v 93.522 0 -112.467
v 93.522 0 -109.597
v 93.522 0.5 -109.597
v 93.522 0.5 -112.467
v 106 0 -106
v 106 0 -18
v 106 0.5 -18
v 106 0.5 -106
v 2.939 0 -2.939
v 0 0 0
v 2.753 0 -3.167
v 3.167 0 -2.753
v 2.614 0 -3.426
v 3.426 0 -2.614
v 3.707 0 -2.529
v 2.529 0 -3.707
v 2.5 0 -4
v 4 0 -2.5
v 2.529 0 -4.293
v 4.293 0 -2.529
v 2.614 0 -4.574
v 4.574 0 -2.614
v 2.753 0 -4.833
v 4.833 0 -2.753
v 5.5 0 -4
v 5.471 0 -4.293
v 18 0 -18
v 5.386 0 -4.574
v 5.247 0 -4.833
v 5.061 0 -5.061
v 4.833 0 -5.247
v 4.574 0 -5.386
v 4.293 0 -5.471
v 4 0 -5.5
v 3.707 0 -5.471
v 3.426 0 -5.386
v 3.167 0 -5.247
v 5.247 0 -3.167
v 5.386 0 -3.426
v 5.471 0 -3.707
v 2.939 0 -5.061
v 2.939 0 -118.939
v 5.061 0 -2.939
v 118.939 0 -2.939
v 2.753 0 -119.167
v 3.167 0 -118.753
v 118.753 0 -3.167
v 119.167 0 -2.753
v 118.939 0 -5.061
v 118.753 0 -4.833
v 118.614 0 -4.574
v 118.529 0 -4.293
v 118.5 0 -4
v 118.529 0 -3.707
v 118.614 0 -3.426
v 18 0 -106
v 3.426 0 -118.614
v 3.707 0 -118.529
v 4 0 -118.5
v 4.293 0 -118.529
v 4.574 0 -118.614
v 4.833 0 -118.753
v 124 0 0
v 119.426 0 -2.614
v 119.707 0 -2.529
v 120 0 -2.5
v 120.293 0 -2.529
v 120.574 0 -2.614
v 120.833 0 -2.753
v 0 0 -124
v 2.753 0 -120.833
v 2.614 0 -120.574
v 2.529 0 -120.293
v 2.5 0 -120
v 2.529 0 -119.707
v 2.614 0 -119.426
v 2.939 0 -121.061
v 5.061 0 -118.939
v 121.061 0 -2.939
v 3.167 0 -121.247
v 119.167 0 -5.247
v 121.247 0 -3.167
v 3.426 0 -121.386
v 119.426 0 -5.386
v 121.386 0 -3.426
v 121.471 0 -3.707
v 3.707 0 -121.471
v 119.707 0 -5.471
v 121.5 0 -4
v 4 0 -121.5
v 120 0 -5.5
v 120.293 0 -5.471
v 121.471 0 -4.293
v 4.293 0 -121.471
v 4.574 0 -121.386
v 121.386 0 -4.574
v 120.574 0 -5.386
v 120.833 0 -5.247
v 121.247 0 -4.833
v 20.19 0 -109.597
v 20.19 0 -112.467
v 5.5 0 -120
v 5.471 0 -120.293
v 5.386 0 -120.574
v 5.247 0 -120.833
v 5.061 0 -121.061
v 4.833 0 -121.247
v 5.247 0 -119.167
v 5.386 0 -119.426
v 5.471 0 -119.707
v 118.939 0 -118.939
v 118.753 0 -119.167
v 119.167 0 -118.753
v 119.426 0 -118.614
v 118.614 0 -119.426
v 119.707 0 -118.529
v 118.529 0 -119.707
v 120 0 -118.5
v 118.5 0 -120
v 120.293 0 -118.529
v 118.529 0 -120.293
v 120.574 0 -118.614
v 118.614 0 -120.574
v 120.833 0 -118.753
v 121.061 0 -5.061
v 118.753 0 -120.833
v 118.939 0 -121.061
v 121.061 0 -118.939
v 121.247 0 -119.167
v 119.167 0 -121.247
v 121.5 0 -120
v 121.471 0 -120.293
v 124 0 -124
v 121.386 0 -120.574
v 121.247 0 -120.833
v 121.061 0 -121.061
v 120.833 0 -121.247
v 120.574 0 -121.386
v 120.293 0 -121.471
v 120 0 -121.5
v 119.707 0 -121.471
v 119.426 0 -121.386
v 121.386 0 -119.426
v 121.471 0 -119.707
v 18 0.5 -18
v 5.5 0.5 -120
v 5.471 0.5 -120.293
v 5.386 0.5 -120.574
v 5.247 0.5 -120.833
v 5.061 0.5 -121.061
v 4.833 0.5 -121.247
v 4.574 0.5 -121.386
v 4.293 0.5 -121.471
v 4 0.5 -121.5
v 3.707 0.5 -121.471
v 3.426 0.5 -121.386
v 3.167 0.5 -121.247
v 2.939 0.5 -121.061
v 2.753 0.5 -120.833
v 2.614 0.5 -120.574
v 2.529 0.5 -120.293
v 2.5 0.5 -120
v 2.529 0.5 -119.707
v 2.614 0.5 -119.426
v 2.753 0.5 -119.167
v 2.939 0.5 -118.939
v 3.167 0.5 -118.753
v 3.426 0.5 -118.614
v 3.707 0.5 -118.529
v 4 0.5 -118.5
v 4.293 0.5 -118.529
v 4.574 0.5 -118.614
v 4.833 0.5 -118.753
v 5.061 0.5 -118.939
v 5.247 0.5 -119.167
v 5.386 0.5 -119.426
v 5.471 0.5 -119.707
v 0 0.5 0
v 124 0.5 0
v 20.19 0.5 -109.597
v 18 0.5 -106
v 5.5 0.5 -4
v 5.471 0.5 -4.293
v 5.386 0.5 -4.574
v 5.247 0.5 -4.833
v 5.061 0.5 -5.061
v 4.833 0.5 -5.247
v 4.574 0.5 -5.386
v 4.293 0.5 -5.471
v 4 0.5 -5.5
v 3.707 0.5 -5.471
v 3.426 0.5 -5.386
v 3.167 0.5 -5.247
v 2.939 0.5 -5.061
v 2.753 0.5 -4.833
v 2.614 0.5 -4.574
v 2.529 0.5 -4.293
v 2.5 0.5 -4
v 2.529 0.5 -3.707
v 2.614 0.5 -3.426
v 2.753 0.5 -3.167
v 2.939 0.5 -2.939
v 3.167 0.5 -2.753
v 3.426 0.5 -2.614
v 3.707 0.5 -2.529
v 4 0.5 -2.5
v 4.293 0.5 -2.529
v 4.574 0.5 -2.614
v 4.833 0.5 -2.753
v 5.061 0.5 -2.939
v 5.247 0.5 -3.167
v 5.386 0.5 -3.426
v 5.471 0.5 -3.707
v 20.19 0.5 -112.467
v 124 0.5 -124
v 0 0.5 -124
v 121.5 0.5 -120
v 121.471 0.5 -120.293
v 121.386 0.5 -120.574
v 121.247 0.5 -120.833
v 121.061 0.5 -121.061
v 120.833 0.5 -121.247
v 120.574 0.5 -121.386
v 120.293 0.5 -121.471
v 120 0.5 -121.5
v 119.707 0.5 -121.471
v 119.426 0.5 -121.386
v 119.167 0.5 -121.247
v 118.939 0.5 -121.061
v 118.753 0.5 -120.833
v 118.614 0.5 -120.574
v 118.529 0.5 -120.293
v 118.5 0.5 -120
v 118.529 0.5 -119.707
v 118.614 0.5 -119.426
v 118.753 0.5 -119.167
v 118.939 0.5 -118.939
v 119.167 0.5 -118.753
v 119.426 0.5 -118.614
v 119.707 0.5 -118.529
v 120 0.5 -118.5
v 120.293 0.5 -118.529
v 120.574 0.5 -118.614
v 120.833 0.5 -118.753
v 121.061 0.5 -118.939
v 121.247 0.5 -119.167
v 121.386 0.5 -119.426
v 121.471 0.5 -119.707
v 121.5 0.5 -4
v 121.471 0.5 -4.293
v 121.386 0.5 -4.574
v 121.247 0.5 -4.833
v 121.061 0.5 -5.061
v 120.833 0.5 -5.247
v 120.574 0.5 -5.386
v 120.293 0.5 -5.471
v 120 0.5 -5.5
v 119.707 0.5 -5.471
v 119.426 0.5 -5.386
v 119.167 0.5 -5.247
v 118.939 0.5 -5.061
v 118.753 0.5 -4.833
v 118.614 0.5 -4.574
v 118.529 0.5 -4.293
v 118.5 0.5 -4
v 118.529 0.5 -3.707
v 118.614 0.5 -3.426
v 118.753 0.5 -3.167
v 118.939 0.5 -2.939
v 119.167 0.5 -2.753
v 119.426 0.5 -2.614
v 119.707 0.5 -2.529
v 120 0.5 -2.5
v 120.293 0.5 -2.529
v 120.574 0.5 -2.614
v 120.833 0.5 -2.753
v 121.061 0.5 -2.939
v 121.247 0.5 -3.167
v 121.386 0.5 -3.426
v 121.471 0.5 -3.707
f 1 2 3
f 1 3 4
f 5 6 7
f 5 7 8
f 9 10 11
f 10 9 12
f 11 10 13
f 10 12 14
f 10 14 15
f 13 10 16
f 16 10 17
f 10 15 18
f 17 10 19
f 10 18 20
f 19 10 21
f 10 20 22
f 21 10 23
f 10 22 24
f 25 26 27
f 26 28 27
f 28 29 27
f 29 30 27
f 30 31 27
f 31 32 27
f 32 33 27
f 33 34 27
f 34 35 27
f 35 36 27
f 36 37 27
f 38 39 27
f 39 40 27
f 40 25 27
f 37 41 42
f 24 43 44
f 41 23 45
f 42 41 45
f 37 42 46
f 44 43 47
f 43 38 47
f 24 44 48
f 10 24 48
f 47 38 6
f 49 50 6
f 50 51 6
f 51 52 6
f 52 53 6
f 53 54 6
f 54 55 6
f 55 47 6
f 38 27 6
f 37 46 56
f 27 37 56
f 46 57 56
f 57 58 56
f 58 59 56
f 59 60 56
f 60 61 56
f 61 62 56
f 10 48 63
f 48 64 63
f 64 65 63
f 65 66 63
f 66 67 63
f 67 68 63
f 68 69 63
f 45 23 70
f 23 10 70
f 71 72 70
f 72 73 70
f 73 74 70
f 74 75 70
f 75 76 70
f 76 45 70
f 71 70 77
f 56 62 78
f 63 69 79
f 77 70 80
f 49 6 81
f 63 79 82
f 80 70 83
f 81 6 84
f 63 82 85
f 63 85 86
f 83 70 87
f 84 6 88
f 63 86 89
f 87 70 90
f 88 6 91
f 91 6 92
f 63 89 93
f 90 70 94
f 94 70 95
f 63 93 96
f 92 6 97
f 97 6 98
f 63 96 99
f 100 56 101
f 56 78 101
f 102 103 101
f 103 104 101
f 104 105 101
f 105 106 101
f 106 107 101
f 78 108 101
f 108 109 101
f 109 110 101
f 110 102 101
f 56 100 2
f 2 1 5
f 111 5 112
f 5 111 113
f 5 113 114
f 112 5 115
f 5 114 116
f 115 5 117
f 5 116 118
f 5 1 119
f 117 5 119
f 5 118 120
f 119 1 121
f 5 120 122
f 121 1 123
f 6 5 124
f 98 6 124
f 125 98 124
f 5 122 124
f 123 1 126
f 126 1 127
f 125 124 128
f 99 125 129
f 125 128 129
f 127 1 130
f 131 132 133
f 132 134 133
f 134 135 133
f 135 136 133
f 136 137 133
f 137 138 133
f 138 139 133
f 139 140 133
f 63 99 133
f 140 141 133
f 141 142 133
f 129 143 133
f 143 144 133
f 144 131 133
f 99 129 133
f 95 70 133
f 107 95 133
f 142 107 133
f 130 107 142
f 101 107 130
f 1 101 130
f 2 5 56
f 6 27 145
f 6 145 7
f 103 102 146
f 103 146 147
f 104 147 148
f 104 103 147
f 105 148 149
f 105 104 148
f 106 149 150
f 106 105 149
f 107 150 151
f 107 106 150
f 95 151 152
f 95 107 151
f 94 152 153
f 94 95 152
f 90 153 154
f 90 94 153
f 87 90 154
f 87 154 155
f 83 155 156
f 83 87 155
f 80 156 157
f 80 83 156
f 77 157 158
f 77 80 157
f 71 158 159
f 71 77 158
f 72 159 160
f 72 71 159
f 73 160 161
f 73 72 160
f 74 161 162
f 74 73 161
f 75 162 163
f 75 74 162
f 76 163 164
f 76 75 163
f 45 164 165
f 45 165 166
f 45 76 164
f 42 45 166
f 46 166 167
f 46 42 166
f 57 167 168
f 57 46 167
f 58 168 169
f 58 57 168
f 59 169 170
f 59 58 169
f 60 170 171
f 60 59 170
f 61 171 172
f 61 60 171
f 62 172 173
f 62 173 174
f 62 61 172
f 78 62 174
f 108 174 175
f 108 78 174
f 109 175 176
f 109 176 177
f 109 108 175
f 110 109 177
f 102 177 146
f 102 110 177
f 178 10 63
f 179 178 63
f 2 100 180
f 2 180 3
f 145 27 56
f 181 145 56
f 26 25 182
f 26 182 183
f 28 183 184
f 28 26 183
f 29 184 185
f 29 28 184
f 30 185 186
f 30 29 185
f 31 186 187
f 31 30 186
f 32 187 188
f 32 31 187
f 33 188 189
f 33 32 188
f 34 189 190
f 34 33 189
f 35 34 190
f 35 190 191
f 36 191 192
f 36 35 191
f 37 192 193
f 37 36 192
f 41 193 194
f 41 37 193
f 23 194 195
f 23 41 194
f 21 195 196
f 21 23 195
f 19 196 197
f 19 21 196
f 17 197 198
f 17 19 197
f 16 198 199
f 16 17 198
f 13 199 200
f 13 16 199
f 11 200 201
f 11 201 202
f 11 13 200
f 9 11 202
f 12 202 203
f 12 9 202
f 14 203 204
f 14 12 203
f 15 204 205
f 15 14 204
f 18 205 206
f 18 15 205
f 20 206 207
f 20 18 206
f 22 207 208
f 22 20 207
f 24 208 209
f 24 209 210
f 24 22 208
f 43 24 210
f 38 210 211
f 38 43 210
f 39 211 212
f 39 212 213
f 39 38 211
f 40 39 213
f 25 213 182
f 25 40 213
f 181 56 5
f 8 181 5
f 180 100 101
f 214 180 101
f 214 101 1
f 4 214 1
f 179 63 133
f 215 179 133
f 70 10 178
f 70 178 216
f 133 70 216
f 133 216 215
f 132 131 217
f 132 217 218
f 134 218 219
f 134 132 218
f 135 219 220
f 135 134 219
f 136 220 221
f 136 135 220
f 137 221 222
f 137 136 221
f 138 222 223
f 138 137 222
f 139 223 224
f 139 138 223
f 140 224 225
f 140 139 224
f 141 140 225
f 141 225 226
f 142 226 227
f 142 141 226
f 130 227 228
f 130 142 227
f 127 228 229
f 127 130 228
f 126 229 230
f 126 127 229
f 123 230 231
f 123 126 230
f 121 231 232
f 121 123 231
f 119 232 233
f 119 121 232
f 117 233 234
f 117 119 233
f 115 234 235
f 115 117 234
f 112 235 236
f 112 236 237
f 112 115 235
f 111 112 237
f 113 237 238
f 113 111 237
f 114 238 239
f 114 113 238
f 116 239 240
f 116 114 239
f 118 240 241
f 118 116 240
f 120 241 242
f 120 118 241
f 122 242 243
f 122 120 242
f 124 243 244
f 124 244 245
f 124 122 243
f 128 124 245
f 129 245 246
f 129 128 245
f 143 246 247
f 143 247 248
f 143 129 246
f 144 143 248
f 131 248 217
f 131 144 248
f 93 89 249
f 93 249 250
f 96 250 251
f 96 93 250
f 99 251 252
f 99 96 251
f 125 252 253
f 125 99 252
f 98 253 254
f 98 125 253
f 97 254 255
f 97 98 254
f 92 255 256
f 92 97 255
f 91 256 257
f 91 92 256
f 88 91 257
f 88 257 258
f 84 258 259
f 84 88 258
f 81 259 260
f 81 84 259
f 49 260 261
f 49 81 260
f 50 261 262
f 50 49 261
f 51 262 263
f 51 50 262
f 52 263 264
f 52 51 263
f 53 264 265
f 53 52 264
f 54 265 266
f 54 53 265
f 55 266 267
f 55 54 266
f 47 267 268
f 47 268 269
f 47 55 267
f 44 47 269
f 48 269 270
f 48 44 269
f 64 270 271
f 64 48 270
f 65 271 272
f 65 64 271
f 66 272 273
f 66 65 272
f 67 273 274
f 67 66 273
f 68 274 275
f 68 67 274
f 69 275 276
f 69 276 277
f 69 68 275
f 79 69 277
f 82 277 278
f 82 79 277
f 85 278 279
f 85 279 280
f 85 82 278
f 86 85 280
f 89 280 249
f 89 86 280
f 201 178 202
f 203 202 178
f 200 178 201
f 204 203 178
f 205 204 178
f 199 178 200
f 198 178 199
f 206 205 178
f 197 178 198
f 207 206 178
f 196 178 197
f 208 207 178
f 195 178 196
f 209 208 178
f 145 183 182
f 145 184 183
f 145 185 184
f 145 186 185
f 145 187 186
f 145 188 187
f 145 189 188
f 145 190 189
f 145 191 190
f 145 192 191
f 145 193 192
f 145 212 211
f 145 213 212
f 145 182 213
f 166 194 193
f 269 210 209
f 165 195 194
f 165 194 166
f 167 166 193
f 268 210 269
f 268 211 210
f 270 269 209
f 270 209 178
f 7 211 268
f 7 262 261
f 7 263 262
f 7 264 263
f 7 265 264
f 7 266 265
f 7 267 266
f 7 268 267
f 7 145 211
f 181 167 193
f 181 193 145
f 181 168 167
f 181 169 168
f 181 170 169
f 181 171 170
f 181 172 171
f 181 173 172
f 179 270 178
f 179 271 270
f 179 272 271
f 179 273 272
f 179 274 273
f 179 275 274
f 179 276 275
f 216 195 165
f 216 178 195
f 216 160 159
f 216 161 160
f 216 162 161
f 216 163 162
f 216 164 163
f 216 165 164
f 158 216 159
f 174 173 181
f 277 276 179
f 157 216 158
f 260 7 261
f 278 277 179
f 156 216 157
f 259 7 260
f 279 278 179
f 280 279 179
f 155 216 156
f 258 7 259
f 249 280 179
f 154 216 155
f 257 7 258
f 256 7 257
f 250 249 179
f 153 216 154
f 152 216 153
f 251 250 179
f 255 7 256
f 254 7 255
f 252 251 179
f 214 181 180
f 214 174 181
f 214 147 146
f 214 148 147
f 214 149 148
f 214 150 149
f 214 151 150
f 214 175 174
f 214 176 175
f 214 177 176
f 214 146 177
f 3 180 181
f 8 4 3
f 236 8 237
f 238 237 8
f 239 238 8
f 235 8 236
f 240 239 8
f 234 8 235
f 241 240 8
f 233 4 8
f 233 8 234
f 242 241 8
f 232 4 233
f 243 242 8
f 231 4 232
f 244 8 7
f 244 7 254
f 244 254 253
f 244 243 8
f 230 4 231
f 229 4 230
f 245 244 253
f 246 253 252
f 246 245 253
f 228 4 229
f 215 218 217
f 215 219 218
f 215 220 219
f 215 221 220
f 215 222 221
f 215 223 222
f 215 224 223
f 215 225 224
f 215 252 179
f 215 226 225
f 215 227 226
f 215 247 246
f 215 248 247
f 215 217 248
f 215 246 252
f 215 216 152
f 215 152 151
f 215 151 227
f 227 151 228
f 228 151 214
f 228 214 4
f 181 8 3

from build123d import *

# Parameters (mm, degrees)
SKETCH_1_W      = 124
SKETCH_1_H      = 124
SKETCH_1_R      = 1.5
SKETCH_1_W_2    = 88
SKETCH_1_H_2    = 88
SKETCH_1_W_3    = 73.332050418
SKETCH_1_H_3    = 2.87064966
EXTRUDE_1_DEPTH = 0.5


with BuildPart() as part:
    # Эскиз1 → Бобышка-Вытянуть1 (new body)
    with BuildSketch(Plane(origin=(0, 0, 0), x_dir=(1, 0, 0), z_dir=(0, 1, 0))):
        with Locations((62, 62)):
            Rectangle(SKETCH_1_W, SKETCH_1_H)
        with Locations((4, 120)):
            Circle(SKETCH_1_R, mode=Mode.SUBTRACT)
        with Locations((120, 120)):
            Circle(SKETCH_1_R, mode=Mode.SUBTRACT)
        with Locations((120, 4)):
            Circle(SKETCH_1_R, mode=Mode.SUBTRACT)
        with Locations((4, 4)):
            Circle(SKETCH_1_R, mode=Mode.SUBTRACT)
        with Locations((62, 62)):
            Rectangle(SKETCH_1_W_2, SKETCH_1_H_2, mode=Mode.SUBTRACT)
        with Locations((56.855908172, 111.032001236)):
            Rectangle(SKETCH_1_W_3, SKETCH_1_H_3, mode=Mode.SUBTRACT)
    extrude(amount=EXTRUDE_1_DEPTH)


solid = part.part
